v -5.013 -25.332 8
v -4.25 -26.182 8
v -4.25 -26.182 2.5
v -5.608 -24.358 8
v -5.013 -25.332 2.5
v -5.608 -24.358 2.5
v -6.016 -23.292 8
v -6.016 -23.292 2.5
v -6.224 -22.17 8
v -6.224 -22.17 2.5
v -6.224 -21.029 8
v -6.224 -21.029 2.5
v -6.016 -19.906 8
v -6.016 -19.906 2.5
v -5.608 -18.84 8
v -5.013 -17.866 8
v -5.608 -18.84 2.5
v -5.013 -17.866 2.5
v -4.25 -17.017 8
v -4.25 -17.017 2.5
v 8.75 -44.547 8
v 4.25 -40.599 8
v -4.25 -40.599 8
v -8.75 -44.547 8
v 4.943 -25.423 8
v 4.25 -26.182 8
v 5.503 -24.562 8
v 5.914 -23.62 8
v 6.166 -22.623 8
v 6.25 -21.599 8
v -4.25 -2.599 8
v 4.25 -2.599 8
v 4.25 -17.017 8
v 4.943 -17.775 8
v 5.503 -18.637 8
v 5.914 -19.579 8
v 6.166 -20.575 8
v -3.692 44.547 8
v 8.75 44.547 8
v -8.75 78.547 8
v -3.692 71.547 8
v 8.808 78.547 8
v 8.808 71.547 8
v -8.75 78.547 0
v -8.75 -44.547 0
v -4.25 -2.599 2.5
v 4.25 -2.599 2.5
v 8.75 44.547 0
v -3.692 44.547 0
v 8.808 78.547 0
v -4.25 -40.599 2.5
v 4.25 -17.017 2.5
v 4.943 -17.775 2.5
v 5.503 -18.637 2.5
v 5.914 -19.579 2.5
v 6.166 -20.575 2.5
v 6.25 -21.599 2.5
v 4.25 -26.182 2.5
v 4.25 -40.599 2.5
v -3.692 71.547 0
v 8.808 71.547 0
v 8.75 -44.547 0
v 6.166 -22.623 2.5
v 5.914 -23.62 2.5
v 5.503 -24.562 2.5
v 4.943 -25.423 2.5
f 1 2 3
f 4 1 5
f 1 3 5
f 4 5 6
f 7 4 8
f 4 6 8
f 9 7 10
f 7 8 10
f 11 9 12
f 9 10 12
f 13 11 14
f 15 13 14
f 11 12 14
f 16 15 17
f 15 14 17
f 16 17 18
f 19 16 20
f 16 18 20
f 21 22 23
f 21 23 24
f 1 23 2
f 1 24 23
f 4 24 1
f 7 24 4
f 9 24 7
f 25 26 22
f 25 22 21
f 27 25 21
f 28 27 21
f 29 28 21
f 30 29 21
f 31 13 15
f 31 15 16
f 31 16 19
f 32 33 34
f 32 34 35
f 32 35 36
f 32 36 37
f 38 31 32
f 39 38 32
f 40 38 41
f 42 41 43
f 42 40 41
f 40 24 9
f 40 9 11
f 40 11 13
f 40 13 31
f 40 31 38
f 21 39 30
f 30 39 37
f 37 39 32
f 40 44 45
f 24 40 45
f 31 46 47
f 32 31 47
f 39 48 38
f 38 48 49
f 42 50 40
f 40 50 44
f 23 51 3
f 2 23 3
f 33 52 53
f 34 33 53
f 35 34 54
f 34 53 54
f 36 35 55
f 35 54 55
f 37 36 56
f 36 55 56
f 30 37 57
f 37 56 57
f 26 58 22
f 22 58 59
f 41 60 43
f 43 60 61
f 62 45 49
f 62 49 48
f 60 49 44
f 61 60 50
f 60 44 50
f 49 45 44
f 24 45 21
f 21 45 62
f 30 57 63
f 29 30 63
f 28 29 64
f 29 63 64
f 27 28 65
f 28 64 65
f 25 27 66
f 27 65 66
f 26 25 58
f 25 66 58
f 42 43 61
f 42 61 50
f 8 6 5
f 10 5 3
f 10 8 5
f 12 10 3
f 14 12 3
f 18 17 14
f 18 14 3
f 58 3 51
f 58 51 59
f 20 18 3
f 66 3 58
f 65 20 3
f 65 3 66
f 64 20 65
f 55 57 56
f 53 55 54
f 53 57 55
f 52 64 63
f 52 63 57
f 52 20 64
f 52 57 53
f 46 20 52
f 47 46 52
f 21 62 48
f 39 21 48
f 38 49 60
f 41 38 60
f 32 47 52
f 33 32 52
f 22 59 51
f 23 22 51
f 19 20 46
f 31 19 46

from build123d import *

# Parameters (mm, degrees)
F0_W     = 12.5
F0_H     = 7
F1_DEPTH = 8
F2_DEPTH = 2.5


# Not quite as in the source:
# - a feature names something its author has since deleted; it is built from what else it names


with BuildPart() as f1:
    # F0 (on Top) → F1 (new body)
    with BuildSketch(Plane.XY):
        Polygon((-3.75, 44.5469365077), (-3.6919084378, 44.5469365077), (-3.6919084378, 71.5469365077), (-3.6919084378, 78.5469365077), (-8.75, 78.5469365077), (-8.75, 44.5469365077), align=None)
        Polygon((8.75, -44.5469365077), (8.75, 44.5469365077), (3.75, 44.5469365077), (-3.6919084378, 44.5469365077), (-3.75, 44.5469365077), (-8.75, 44.5469365077), (-8.75, -44.5469365077), align=None)
        with BuildLine():
            Line((-4.25, -2.5992627119), (4.25, -2.5992627119))
            Line((4.25, -2.5992627119), (4.25, -17.016687017))
            ThreePointArc((4.25, -17.016687017), (5.7282196187, -19.0992627119), (6.25, -21.5992627119))
            ThreePointArc((6.25, -21.5992627119), (5.7282196187, -24.0992627119), (4.25, -26.1818384069))
            Line((4.25, -26.1818384069), (4.25, -40.5992627119))
            Line((4.25, -40.5992627119), (-4.25, -40.5992627119))
            Line((-4.25, -40.5992627119), (-4.25, -26.1818384069))
            ThreePointArc((-4.25, -26.1818384069), (-6.25, -21.5992627119), (-4.25, -17.016687017))
            Line((-4.25, -17.016687017), (-4.25, -2.5992627119))
        make_face(mode=Mode.SUBTRACT)
        with Locations((2.5580915622, 75.0469365077)):
            Rectangle(F0_W, F0_H)
    extrude(amount=F1_DEPTH)

    # F0 (on Top) → F2 (join)
    with BuildSketch(Plane.XY):
        with BuildLine():
            Line((4.25, -40.5992627119), (4.25, -26.1818384069))
            ThreePointArc((4.25, -26.1818384069), (0, -27.8492627119), (-4.25, -26.1818384069))
            Line((-4.25, -26.1818384069), (-4.25, -40.5992627119))
            Line((-4.25, -40.5992627119), (4.25, -40.5992627119))
        make_face()
        with BuildLine():
            Line((4.25, -26.1818384069), (4.25, -17.016687017))
            ThreePointArc((4.25, -17.016687017), (0, -15.3492627119), (-4.25, -17.016687017))
            Line((-4.25, -17.016687017), (-4.25, -26.1818384069))
            ThreePointArc((-4.25, -26.1818384069), (0, -27.8492627119), (4.25, -26.1818384069))
        make_face()
        with BuildLine():
            Line((4.25, -17.016687017), (4.25, -2.5992627119))
            Line((4.25, -2.5992627119), (-4.25, -2.5992627119))
            Line((-4.25, -2.5992627119), (-4.25, -17.016687017))
            ThreePointArc((-4.25, -17.016687017), (0, -15.3492627119), (4.25, -17.016687017))
        make_face()
        with BuildLine():
            ThreePointArc((6.25, -21.5992627119), (5.7282196187, -19.0992627119), (4.25, -17.016687017))
            Line((4.25, -17.016687017), (4.25, -26.1818384069))
            ThreePointArc((4.25, -26.1818384069), (5.7282196187, -24.0992627119), (6.25, -21.5992627119))
        make_face()
        with BuildLine():
            Line((-4.25, -26.1818384069), (-4.25, -17.016687017))
            ThreePointArc((-4.25, -17.016687017), (-6.25, -21.5992627119), (-4.25, -26.1818384069))
        make_face()
    extrude(amount=F2_DEPTH)


solid = f1.part
